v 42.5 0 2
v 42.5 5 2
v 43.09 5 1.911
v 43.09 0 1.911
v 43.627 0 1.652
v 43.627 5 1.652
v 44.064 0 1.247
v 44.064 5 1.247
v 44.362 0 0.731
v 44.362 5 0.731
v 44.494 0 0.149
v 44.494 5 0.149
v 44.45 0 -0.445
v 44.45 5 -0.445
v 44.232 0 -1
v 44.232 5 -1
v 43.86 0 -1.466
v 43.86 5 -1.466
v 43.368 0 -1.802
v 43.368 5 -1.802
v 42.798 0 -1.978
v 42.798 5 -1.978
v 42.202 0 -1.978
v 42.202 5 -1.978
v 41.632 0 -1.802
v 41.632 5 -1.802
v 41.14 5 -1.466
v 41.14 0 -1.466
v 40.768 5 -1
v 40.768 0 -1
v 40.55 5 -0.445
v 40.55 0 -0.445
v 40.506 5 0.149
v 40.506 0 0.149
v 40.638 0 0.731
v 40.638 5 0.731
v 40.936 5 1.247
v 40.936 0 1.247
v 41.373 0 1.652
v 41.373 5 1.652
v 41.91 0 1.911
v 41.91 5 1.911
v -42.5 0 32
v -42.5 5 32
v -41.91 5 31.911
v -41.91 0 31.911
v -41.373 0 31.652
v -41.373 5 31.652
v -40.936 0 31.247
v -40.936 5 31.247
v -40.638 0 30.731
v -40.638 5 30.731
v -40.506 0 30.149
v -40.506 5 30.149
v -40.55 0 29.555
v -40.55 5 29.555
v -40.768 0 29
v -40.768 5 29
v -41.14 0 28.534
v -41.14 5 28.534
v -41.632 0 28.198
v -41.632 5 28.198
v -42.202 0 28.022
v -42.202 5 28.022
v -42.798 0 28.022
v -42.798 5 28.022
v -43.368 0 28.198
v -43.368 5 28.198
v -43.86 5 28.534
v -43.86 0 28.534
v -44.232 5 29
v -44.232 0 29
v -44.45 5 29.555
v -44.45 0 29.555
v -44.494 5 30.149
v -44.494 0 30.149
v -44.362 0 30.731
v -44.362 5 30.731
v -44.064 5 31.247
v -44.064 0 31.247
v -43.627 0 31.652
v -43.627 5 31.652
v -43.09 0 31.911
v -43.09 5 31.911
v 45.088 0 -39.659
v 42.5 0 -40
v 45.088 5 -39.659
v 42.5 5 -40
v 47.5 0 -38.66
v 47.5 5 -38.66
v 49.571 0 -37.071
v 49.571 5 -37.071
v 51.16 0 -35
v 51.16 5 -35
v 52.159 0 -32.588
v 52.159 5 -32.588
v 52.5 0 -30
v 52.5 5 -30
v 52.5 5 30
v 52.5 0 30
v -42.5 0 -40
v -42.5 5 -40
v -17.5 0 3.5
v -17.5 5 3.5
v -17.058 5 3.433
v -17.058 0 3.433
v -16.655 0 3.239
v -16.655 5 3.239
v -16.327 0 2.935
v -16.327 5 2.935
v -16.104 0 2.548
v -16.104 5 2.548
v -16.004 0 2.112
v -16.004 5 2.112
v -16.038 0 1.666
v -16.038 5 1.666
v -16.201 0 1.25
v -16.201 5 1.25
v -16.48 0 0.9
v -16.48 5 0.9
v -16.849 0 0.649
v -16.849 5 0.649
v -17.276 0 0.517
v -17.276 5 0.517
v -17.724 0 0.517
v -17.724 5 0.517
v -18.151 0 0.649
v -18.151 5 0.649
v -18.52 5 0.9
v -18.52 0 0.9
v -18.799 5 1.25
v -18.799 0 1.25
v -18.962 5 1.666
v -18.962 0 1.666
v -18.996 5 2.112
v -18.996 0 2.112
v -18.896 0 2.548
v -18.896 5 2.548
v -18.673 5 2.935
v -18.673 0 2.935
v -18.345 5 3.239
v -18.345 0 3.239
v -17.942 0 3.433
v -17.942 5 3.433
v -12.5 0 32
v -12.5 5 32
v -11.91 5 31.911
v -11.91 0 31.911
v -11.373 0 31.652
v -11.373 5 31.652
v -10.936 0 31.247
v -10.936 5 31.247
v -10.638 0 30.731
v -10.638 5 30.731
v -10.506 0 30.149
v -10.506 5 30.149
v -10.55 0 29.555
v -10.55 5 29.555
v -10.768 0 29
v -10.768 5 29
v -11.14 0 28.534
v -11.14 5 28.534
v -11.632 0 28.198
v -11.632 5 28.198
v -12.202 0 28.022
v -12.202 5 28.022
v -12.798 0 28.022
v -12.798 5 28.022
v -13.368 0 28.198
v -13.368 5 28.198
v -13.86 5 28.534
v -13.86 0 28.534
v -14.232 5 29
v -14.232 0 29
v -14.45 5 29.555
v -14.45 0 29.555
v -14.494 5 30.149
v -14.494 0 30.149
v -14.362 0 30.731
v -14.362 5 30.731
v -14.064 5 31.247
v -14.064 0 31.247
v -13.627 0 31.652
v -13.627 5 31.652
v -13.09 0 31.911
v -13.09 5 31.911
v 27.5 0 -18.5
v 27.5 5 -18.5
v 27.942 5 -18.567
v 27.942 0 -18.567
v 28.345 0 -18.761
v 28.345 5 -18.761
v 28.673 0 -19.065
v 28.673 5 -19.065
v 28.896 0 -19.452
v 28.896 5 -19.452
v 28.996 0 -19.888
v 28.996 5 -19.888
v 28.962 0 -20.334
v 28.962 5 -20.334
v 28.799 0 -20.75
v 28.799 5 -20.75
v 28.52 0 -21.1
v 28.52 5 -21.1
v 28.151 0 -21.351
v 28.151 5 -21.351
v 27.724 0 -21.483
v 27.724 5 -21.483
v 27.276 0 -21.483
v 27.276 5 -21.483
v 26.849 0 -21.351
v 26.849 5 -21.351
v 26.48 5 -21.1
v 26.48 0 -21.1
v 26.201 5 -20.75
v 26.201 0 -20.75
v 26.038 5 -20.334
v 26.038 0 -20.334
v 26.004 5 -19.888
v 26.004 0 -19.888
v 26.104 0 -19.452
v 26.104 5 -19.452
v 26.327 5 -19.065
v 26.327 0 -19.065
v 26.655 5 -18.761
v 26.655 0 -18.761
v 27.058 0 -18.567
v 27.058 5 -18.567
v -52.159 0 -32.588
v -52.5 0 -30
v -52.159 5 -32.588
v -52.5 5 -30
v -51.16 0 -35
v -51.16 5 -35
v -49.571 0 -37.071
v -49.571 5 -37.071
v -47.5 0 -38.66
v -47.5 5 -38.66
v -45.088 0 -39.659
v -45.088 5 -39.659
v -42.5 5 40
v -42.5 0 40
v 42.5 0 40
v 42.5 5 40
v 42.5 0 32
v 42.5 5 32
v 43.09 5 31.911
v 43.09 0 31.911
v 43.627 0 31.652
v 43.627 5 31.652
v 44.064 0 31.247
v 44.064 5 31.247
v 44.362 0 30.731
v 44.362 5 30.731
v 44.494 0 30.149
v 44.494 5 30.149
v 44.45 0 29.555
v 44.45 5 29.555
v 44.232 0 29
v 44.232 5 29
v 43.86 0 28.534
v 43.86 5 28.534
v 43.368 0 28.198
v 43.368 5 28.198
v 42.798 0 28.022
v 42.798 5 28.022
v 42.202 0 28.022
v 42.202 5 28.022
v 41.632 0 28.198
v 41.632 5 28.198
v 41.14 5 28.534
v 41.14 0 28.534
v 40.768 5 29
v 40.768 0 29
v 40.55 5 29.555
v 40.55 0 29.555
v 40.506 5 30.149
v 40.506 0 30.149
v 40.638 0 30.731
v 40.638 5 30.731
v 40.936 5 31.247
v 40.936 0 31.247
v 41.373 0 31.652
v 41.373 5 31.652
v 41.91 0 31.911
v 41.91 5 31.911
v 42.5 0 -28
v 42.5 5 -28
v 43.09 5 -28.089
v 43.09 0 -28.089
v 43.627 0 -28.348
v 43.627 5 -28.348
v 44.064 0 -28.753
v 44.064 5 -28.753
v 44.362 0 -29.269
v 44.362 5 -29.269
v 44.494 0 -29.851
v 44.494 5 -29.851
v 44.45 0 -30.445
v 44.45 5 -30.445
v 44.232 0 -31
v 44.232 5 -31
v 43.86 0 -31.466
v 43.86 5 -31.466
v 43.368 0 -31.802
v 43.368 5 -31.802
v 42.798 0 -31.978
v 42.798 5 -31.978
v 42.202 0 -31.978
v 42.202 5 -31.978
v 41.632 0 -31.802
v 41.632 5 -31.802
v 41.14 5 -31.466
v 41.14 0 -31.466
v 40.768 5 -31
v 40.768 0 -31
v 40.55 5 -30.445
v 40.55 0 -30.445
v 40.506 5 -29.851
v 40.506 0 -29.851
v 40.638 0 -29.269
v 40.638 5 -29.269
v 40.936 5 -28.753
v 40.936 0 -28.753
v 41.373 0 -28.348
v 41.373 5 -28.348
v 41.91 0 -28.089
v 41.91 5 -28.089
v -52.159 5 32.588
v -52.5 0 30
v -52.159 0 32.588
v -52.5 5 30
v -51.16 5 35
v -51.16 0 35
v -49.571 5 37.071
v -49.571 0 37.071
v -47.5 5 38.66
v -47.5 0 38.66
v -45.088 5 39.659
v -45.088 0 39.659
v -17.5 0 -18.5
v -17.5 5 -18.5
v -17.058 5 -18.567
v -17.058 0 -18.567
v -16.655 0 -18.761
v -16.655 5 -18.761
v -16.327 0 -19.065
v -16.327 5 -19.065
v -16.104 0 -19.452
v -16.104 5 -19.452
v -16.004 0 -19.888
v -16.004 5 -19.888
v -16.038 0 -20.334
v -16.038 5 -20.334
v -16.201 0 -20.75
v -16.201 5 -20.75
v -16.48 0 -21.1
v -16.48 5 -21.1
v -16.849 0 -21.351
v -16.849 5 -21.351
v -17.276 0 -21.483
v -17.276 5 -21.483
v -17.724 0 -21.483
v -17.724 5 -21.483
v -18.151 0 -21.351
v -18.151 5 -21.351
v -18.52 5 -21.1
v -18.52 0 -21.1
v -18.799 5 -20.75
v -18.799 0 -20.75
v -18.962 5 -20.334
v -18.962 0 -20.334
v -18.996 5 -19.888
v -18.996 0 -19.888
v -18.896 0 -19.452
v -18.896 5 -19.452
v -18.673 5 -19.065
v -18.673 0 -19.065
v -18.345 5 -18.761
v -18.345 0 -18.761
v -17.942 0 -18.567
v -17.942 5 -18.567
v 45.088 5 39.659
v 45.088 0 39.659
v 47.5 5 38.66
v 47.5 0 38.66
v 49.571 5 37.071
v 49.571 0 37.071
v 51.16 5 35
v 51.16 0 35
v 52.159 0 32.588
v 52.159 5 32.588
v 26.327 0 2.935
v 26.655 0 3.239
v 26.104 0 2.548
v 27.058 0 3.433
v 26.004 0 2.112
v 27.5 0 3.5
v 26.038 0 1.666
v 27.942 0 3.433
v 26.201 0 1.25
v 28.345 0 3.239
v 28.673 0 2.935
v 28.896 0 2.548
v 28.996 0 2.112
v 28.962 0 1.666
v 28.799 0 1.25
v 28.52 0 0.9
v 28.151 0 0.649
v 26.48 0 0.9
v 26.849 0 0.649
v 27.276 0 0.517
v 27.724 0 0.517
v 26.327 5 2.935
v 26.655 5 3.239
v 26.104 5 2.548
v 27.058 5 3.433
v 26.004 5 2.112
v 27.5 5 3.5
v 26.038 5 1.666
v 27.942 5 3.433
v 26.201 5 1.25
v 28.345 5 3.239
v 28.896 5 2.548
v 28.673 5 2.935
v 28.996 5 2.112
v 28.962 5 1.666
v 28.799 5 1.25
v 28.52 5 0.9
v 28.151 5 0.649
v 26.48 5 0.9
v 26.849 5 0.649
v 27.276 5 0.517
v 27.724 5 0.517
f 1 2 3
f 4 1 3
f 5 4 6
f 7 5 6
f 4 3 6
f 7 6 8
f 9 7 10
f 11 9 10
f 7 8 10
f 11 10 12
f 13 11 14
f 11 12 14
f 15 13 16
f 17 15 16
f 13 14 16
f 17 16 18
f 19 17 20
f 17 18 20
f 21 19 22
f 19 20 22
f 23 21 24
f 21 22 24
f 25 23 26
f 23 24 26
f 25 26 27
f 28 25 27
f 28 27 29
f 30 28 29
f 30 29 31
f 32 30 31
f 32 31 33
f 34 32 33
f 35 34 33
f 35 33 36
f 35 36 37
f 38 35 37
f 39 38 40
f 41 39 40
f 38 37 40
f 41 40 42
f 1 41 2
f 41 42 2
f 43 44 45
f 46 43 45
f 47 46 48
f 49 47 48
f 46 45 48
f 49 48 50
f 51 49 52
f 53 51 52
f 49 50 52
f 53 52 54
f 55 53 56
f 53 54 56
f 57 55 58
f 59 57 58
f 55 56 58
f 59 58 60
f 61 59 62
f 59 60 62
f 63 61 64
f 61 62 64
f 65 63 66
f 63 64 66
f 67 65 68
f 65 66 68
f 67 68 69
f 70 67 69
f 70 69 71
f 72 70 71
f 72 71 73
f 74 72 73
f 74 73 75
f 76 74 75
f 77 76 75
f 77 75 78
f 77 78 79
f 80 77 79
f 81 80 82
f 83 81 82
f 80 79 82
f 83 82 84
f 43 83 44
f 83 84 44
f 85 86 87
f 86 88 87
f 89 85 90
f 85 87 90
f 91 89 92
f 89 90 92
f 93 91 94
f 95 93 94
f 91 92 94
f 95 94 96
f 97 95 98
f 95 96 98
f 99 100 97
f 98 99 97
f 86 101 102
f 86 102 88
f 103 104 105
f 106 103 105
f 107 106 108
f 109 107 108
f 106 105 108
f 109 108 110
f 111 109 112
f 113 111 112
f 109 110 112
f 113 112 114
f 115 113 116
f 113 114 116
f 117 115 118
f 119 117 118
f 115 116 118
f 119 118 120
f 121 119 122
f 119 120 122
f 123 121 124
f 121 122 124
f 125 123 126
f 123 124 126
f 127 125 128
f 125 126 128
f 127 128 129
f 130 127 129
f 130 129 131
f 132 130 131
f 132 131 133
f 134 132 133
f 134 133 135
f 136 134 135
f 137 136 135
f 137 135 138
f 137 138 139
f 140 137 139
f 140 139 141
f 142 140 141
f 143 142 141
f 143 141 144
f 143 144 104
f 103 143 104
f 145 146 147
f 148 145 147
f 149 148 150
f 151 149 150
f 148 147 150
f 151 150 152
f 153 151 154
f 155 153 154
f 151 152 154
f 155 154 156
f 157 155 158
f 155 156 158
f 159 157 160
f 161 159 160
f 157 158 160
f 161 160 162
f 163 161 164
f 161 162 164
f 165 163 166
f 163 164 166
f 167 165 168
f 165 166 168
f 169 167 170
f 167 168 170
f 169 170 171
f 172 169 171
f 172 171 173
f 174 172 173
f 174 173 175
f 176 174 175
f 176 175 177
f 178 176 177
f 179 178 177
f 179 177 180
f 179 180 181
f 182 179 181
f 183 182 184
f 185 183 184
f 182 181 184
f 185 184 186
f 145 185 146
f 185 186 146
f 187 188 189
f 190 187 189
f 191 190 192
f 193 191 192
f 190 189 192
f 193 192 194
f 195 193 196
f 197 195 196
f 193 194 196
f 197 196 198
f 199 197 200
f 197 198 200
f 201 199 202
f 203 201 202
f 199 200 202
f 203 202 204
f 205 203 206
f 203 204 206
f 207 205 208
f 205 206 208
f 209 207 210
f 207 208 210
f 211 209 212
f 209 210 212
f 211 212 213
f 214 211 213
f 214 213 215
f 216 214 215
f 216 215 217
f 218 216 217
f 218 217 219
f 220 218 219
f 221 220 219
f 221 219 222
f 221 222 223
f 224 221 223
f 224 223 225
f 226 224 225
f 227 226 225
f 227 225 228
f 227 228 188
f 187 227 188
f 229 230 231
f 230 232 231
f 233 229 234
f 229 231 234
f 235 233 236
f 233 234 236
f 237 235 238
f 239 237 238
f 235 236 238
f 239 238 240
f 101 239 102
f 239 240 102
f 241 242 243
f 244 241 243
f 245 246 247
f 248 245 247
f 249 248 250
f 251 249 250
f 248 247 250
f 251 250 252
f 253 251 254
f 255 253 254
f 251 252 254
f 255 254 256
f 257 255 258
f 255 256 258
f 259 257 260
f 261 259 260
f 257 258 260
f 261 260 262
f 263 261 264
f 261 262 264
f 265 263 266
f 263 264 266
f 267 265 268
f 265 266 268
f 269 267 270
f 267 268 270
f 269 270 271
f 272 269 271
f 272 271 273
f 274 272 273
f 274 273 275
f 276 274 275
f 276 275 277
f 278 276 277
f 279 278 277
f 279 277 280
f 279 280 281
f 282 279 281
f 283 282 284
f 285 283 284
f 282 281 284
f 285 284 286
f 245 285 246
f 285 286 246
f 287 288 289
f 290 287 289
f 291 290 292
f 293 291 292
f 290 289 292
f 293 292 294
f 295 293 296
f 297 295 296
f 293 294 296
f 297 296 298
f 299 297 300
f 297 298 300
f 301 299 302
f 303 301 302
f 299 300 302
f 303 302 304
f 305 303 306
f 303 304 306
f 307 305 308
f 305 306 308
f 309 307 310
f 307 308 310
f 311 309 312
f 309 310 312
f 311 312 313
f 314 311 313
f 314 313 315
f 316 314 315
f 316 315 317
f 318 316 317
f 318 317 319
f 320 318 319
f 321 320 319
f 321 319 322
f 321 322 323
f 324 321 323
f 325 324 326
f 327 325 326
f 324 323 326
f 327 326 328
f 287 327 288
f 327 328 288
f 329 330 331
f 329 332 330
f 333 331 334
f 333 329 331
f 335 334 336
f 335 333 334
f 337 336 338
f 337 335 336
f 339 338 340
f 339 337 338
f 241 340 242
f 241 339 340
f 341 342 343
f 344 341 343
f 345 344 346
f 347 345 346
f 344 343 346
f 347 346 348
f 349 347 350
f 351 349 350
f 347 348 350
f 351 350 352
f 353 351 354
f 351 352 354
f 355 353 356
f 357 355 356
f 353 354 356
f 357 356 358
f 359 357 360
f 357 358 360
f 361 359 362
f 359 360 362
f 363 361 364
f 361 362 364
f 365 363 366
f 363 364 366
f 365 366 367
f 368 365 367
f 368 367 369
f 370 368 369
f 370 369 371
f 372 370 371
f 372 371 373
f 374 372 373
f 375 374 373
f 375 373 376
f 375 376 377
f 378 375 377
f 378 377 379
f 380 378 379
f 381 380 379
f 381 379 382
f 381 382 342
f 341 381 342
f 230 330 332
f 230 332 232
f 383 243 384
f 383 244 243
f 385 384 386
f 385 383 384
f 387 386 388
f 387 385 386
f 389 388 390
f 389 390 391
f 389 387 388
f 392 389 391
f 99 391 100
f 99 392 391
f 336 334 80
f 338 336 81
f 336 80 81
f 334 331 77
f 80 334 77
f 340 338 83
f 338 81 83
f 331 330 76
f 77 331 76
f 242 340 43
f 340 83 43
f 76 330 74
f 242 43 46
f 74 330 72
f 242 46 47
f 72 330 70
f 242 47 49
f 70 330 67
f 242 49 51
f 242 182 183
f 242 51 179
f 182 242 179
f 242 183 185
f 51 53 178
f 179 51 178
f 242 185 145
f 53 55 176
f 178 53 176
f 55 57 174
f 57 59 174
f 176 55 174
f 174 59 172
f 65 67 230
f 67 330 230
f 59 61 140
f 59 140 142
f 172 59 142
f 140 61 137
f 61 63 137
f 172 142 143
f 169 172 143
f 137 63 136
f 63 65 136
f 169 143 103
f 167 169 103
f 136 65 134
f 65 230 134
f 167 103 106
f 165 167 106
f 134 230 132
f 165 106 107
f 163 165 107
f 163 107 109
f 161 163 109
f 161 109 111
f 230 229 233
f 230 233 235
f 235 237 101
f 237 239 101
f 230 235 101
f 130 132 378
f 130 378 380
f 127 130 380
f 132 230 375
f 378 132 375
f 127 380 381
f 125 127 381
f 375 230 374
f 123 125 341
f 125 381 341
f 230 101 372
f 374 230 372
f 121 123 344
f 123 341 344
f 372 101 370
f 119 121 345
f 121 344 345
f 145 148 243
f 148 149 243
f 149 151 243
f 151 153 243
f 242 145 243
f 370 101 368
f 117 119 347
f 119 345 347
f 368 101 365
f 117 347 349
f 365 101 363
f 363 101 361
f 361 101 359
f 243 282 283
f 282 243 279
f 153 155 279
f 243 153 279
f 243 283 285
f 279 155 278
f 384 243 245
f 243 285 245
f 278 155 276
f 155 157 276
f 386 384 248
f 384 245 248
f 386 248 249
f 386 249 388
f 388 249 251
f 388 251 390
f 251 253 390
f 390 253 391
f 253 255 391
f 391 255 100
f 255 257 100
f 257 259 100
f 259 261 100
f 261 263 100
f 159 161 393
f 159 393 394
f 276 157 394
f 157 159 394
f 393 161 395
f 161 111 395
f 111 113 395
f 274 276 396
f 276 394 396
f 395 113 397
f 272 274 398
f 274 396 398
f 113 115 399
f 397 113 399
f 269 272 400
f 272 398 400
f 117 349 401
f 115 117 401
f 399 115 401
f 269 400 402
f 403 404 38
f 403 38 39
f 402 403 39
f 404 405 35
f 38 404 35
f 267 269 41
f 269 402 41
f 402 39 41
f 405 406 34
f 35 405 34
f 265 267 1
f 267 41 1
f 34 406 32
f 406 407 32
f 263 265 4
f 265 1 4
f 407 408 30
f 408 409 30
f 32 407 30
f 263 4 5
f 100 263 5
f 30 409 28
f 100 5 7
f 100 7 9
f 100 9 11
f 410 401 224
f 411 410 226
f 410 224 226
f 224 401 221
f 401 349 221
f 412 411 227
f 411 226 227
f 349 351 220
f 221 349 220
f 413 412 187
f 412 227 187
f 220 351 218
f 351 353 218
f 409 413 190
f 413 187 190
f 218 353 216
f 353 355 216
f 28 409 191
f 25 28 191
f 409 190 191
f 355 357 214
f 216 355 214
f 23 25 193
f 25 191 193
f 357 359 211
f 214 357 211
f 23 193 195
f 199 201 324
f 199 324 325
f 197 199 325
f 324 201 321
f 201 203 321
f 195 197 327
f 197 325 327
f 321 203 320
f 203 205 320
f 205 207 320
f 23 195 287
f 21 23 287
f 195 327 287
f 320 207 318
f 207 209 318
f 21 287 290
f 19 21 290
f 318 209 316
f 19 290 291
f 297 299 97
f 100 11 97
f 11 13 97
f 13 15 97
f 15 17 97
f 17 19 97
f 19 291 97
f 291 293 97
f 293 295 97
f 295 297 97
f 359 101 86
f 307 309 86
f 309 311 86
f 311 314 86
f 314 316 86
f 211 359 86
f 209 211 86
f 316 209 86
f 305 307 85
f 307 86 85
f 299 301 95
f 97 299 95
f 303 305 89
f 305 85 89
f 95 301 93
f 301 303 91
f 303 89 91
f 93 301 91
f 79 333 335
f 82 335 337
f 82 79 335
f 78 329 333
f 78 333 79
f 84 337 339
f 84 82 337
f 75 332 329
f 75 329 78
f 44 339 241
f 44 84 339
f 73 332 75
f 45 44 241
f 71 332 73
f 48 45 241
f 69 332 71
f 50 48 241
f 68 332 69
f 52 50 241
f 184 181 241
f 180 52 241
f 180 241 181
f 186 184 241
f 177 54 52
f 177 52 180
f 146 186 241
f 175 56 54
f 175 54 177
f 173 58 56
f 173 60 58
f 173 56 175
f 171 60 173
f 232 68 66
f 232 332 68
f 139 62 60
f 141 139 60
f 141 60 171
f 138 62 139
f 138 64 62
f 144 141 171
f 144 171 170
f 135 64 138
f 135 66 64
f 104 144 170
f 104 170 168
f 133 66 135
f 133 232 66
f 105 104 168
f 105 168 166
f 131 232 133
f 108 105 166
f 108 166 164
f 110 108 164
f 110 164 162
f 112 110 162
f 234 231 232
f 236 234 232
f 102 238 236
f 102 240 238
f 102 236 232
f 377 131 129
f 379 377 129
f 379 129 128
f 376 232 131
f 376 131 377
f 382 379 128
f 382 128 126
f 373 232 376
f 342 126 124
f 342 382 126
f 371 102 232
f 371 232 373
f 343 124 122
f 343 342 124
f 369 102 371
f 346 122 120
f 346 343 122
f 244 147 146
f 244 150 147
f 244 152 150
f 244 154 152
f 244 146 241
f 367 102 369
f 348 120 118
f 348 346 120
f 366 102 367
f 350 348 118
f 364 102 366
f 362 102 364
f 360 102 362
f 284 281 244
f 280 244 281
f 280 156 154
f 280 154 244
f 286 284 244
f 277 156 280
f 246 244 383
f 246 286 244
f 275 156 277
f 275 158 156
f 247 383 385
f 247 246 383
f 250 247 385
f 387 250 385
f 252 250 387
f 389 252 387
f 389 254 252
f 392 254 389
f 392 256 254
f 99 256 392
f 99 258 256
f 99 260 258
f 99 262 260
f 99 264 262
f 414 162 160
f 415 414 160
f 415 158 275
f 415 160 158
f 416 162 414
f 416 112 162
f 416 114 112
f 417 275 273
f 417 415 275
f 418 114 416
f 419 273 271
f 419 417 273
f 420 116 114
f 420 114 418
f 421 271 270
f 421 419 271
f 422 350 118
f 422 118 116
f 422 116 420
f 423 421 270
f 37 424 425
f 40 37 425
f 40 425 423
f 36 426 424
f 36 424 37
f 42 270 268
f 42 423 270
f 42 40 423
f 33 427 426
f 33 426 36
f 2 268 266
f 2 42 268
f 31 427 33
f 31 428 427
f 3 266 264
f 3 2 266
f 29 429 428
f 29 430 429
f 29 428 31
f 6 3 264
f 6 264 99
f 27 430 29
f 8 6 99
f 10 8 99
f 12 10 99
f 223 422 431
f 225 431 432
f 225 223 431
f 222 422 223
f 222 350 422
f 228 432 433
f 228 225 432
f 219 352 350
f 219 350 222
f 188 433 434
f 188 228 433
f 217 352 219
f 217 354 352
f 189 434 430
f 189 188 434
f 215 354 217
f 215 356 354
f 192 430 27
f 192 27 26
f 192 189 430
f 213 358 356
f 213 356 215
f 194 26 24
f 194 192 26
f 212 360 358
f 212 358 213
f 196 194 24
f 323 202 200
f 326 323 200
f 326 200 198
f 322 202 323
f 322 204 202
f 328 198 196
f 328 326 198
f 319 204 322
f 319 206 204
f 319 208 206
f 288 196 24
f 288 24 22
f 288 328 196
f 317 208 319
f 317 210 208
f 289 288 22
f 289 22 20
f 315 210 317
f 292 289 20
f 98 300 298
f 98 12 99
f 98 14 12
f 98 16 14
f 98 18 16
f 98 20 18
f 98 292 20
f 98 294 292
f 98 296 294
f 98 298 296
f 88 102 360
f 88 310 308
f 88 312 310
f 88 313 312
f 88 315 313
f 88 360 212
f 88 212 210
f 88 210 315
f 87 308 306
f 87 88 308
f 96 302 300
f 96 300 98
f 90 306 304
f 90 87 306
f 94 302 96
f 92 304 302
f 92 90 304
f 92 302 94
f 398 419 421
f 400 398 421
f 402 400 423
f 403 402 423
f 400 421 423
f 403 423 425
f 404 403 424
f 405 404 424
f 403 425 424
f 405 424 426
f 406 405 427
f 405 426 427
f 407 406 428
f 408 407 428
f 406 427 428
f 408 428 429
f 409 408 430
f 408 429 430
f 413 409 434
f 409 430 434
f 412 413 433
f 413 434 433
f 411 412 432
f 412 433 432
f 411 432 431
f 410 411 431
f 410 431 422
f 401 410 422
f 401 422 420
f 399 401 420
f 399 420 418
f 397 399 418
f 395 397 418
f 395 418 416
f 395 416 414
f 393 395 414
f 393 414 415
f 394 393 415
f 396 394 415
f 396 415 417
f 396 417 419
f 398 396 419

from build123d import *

# Parameters (mm, degrees)
SKETCH_1_W          = 105
SKETCH_1_H          = 80
EXTRUDE_1_DEPTH     = 5
SKETCH_2_R          = 1.5
CUT_EXTRUDE_1_DEPTH = 67.191011474
SKETCH_3_R          = 2
CUT_EXTRUDE_2_DEPTH = 5
FILLET_1_R          = 10


with BuildPart() as part:
    # 草图1 → 凸台-拉伸1 (new body)
    with BuildSketch(Plane(origin=(0, 0, 0), x_dir=(1, 0, 0), z_dir=(0, 1, 0))):
        Rectangle(SKETCH_1_W, SKETCH_1_H)
    extrude(amount=EXTRUDE_1_DEPTH)

    # 草图2 → 切除-拉伸1 (cut, through all)
    with BuildSketch(Plane(origin=(0, 5, 0), x_dir=(1, 0, 0), z_dir=(0, 1, 0))):
        with Locations(Location((-17.5, 20, 0), (0, 0, 270))):
            Circle(SKETCH_2_R)
        with Locations(Location((27.5, 20, 0), (0, 0, 270))):
            Circle(SKETCH_2_R)
        with Locations(Location((27.5, -2, 0), (0, 0, 270))):
            Circle(SKETCH_2_R)
        with Locations(Location((-17.5, -2, 0), (0, 0, 270))):
            Circle(SKETCH_2_R)
    extrude(amount=-CUT_EXTRUDE_1_DEPTH, mode=Mode.SUBTRACT)

    # 草图3 → 切除-拉伸2 (cut)
    with BuildSketch(Plane(origin=(0, 5, 0), x_dir=(1, 0, 0), z_dir=(0, 1, 0))):
        with Locations(Location((-12.5, -30, 0), (0, 0, 270))):
            Circle(SKETCH_3_R)
        with Locations(Location((-42.5, -30, 0), (0, 0, 270))):
            Circle(SKETCH_3_R)
        with Locations(Location((42.5, 0, 0), (0, 0, 270))):
            Circle(SKETCH_3_R)
        with Locations(Location((42.5, 30, 0), (0, 0, 270))):
            Circle(SKETCH_3_R)
        with Locations(Location((42.5, -30, 0), (0, 0, 270))):
            Circle(SKETCH_3_R)
    extrude(amount=-CUT_EXTRUDE_2_DEPTH, mode=Mode.SUBTRACT)

    # 圆角1
    fillet_1_edges = [part.edges().sort_by_distance(p)[0] for p in [
        (-52.5, 2.5, -40),
        (52.5, 2.5, -40),
        (52.5, 2.5, 40),
        (-52.5, 2.5, 40),
    ]]
    fillet(fillet_1_edges, radius=FILLET_1_R)


solid = part.part
